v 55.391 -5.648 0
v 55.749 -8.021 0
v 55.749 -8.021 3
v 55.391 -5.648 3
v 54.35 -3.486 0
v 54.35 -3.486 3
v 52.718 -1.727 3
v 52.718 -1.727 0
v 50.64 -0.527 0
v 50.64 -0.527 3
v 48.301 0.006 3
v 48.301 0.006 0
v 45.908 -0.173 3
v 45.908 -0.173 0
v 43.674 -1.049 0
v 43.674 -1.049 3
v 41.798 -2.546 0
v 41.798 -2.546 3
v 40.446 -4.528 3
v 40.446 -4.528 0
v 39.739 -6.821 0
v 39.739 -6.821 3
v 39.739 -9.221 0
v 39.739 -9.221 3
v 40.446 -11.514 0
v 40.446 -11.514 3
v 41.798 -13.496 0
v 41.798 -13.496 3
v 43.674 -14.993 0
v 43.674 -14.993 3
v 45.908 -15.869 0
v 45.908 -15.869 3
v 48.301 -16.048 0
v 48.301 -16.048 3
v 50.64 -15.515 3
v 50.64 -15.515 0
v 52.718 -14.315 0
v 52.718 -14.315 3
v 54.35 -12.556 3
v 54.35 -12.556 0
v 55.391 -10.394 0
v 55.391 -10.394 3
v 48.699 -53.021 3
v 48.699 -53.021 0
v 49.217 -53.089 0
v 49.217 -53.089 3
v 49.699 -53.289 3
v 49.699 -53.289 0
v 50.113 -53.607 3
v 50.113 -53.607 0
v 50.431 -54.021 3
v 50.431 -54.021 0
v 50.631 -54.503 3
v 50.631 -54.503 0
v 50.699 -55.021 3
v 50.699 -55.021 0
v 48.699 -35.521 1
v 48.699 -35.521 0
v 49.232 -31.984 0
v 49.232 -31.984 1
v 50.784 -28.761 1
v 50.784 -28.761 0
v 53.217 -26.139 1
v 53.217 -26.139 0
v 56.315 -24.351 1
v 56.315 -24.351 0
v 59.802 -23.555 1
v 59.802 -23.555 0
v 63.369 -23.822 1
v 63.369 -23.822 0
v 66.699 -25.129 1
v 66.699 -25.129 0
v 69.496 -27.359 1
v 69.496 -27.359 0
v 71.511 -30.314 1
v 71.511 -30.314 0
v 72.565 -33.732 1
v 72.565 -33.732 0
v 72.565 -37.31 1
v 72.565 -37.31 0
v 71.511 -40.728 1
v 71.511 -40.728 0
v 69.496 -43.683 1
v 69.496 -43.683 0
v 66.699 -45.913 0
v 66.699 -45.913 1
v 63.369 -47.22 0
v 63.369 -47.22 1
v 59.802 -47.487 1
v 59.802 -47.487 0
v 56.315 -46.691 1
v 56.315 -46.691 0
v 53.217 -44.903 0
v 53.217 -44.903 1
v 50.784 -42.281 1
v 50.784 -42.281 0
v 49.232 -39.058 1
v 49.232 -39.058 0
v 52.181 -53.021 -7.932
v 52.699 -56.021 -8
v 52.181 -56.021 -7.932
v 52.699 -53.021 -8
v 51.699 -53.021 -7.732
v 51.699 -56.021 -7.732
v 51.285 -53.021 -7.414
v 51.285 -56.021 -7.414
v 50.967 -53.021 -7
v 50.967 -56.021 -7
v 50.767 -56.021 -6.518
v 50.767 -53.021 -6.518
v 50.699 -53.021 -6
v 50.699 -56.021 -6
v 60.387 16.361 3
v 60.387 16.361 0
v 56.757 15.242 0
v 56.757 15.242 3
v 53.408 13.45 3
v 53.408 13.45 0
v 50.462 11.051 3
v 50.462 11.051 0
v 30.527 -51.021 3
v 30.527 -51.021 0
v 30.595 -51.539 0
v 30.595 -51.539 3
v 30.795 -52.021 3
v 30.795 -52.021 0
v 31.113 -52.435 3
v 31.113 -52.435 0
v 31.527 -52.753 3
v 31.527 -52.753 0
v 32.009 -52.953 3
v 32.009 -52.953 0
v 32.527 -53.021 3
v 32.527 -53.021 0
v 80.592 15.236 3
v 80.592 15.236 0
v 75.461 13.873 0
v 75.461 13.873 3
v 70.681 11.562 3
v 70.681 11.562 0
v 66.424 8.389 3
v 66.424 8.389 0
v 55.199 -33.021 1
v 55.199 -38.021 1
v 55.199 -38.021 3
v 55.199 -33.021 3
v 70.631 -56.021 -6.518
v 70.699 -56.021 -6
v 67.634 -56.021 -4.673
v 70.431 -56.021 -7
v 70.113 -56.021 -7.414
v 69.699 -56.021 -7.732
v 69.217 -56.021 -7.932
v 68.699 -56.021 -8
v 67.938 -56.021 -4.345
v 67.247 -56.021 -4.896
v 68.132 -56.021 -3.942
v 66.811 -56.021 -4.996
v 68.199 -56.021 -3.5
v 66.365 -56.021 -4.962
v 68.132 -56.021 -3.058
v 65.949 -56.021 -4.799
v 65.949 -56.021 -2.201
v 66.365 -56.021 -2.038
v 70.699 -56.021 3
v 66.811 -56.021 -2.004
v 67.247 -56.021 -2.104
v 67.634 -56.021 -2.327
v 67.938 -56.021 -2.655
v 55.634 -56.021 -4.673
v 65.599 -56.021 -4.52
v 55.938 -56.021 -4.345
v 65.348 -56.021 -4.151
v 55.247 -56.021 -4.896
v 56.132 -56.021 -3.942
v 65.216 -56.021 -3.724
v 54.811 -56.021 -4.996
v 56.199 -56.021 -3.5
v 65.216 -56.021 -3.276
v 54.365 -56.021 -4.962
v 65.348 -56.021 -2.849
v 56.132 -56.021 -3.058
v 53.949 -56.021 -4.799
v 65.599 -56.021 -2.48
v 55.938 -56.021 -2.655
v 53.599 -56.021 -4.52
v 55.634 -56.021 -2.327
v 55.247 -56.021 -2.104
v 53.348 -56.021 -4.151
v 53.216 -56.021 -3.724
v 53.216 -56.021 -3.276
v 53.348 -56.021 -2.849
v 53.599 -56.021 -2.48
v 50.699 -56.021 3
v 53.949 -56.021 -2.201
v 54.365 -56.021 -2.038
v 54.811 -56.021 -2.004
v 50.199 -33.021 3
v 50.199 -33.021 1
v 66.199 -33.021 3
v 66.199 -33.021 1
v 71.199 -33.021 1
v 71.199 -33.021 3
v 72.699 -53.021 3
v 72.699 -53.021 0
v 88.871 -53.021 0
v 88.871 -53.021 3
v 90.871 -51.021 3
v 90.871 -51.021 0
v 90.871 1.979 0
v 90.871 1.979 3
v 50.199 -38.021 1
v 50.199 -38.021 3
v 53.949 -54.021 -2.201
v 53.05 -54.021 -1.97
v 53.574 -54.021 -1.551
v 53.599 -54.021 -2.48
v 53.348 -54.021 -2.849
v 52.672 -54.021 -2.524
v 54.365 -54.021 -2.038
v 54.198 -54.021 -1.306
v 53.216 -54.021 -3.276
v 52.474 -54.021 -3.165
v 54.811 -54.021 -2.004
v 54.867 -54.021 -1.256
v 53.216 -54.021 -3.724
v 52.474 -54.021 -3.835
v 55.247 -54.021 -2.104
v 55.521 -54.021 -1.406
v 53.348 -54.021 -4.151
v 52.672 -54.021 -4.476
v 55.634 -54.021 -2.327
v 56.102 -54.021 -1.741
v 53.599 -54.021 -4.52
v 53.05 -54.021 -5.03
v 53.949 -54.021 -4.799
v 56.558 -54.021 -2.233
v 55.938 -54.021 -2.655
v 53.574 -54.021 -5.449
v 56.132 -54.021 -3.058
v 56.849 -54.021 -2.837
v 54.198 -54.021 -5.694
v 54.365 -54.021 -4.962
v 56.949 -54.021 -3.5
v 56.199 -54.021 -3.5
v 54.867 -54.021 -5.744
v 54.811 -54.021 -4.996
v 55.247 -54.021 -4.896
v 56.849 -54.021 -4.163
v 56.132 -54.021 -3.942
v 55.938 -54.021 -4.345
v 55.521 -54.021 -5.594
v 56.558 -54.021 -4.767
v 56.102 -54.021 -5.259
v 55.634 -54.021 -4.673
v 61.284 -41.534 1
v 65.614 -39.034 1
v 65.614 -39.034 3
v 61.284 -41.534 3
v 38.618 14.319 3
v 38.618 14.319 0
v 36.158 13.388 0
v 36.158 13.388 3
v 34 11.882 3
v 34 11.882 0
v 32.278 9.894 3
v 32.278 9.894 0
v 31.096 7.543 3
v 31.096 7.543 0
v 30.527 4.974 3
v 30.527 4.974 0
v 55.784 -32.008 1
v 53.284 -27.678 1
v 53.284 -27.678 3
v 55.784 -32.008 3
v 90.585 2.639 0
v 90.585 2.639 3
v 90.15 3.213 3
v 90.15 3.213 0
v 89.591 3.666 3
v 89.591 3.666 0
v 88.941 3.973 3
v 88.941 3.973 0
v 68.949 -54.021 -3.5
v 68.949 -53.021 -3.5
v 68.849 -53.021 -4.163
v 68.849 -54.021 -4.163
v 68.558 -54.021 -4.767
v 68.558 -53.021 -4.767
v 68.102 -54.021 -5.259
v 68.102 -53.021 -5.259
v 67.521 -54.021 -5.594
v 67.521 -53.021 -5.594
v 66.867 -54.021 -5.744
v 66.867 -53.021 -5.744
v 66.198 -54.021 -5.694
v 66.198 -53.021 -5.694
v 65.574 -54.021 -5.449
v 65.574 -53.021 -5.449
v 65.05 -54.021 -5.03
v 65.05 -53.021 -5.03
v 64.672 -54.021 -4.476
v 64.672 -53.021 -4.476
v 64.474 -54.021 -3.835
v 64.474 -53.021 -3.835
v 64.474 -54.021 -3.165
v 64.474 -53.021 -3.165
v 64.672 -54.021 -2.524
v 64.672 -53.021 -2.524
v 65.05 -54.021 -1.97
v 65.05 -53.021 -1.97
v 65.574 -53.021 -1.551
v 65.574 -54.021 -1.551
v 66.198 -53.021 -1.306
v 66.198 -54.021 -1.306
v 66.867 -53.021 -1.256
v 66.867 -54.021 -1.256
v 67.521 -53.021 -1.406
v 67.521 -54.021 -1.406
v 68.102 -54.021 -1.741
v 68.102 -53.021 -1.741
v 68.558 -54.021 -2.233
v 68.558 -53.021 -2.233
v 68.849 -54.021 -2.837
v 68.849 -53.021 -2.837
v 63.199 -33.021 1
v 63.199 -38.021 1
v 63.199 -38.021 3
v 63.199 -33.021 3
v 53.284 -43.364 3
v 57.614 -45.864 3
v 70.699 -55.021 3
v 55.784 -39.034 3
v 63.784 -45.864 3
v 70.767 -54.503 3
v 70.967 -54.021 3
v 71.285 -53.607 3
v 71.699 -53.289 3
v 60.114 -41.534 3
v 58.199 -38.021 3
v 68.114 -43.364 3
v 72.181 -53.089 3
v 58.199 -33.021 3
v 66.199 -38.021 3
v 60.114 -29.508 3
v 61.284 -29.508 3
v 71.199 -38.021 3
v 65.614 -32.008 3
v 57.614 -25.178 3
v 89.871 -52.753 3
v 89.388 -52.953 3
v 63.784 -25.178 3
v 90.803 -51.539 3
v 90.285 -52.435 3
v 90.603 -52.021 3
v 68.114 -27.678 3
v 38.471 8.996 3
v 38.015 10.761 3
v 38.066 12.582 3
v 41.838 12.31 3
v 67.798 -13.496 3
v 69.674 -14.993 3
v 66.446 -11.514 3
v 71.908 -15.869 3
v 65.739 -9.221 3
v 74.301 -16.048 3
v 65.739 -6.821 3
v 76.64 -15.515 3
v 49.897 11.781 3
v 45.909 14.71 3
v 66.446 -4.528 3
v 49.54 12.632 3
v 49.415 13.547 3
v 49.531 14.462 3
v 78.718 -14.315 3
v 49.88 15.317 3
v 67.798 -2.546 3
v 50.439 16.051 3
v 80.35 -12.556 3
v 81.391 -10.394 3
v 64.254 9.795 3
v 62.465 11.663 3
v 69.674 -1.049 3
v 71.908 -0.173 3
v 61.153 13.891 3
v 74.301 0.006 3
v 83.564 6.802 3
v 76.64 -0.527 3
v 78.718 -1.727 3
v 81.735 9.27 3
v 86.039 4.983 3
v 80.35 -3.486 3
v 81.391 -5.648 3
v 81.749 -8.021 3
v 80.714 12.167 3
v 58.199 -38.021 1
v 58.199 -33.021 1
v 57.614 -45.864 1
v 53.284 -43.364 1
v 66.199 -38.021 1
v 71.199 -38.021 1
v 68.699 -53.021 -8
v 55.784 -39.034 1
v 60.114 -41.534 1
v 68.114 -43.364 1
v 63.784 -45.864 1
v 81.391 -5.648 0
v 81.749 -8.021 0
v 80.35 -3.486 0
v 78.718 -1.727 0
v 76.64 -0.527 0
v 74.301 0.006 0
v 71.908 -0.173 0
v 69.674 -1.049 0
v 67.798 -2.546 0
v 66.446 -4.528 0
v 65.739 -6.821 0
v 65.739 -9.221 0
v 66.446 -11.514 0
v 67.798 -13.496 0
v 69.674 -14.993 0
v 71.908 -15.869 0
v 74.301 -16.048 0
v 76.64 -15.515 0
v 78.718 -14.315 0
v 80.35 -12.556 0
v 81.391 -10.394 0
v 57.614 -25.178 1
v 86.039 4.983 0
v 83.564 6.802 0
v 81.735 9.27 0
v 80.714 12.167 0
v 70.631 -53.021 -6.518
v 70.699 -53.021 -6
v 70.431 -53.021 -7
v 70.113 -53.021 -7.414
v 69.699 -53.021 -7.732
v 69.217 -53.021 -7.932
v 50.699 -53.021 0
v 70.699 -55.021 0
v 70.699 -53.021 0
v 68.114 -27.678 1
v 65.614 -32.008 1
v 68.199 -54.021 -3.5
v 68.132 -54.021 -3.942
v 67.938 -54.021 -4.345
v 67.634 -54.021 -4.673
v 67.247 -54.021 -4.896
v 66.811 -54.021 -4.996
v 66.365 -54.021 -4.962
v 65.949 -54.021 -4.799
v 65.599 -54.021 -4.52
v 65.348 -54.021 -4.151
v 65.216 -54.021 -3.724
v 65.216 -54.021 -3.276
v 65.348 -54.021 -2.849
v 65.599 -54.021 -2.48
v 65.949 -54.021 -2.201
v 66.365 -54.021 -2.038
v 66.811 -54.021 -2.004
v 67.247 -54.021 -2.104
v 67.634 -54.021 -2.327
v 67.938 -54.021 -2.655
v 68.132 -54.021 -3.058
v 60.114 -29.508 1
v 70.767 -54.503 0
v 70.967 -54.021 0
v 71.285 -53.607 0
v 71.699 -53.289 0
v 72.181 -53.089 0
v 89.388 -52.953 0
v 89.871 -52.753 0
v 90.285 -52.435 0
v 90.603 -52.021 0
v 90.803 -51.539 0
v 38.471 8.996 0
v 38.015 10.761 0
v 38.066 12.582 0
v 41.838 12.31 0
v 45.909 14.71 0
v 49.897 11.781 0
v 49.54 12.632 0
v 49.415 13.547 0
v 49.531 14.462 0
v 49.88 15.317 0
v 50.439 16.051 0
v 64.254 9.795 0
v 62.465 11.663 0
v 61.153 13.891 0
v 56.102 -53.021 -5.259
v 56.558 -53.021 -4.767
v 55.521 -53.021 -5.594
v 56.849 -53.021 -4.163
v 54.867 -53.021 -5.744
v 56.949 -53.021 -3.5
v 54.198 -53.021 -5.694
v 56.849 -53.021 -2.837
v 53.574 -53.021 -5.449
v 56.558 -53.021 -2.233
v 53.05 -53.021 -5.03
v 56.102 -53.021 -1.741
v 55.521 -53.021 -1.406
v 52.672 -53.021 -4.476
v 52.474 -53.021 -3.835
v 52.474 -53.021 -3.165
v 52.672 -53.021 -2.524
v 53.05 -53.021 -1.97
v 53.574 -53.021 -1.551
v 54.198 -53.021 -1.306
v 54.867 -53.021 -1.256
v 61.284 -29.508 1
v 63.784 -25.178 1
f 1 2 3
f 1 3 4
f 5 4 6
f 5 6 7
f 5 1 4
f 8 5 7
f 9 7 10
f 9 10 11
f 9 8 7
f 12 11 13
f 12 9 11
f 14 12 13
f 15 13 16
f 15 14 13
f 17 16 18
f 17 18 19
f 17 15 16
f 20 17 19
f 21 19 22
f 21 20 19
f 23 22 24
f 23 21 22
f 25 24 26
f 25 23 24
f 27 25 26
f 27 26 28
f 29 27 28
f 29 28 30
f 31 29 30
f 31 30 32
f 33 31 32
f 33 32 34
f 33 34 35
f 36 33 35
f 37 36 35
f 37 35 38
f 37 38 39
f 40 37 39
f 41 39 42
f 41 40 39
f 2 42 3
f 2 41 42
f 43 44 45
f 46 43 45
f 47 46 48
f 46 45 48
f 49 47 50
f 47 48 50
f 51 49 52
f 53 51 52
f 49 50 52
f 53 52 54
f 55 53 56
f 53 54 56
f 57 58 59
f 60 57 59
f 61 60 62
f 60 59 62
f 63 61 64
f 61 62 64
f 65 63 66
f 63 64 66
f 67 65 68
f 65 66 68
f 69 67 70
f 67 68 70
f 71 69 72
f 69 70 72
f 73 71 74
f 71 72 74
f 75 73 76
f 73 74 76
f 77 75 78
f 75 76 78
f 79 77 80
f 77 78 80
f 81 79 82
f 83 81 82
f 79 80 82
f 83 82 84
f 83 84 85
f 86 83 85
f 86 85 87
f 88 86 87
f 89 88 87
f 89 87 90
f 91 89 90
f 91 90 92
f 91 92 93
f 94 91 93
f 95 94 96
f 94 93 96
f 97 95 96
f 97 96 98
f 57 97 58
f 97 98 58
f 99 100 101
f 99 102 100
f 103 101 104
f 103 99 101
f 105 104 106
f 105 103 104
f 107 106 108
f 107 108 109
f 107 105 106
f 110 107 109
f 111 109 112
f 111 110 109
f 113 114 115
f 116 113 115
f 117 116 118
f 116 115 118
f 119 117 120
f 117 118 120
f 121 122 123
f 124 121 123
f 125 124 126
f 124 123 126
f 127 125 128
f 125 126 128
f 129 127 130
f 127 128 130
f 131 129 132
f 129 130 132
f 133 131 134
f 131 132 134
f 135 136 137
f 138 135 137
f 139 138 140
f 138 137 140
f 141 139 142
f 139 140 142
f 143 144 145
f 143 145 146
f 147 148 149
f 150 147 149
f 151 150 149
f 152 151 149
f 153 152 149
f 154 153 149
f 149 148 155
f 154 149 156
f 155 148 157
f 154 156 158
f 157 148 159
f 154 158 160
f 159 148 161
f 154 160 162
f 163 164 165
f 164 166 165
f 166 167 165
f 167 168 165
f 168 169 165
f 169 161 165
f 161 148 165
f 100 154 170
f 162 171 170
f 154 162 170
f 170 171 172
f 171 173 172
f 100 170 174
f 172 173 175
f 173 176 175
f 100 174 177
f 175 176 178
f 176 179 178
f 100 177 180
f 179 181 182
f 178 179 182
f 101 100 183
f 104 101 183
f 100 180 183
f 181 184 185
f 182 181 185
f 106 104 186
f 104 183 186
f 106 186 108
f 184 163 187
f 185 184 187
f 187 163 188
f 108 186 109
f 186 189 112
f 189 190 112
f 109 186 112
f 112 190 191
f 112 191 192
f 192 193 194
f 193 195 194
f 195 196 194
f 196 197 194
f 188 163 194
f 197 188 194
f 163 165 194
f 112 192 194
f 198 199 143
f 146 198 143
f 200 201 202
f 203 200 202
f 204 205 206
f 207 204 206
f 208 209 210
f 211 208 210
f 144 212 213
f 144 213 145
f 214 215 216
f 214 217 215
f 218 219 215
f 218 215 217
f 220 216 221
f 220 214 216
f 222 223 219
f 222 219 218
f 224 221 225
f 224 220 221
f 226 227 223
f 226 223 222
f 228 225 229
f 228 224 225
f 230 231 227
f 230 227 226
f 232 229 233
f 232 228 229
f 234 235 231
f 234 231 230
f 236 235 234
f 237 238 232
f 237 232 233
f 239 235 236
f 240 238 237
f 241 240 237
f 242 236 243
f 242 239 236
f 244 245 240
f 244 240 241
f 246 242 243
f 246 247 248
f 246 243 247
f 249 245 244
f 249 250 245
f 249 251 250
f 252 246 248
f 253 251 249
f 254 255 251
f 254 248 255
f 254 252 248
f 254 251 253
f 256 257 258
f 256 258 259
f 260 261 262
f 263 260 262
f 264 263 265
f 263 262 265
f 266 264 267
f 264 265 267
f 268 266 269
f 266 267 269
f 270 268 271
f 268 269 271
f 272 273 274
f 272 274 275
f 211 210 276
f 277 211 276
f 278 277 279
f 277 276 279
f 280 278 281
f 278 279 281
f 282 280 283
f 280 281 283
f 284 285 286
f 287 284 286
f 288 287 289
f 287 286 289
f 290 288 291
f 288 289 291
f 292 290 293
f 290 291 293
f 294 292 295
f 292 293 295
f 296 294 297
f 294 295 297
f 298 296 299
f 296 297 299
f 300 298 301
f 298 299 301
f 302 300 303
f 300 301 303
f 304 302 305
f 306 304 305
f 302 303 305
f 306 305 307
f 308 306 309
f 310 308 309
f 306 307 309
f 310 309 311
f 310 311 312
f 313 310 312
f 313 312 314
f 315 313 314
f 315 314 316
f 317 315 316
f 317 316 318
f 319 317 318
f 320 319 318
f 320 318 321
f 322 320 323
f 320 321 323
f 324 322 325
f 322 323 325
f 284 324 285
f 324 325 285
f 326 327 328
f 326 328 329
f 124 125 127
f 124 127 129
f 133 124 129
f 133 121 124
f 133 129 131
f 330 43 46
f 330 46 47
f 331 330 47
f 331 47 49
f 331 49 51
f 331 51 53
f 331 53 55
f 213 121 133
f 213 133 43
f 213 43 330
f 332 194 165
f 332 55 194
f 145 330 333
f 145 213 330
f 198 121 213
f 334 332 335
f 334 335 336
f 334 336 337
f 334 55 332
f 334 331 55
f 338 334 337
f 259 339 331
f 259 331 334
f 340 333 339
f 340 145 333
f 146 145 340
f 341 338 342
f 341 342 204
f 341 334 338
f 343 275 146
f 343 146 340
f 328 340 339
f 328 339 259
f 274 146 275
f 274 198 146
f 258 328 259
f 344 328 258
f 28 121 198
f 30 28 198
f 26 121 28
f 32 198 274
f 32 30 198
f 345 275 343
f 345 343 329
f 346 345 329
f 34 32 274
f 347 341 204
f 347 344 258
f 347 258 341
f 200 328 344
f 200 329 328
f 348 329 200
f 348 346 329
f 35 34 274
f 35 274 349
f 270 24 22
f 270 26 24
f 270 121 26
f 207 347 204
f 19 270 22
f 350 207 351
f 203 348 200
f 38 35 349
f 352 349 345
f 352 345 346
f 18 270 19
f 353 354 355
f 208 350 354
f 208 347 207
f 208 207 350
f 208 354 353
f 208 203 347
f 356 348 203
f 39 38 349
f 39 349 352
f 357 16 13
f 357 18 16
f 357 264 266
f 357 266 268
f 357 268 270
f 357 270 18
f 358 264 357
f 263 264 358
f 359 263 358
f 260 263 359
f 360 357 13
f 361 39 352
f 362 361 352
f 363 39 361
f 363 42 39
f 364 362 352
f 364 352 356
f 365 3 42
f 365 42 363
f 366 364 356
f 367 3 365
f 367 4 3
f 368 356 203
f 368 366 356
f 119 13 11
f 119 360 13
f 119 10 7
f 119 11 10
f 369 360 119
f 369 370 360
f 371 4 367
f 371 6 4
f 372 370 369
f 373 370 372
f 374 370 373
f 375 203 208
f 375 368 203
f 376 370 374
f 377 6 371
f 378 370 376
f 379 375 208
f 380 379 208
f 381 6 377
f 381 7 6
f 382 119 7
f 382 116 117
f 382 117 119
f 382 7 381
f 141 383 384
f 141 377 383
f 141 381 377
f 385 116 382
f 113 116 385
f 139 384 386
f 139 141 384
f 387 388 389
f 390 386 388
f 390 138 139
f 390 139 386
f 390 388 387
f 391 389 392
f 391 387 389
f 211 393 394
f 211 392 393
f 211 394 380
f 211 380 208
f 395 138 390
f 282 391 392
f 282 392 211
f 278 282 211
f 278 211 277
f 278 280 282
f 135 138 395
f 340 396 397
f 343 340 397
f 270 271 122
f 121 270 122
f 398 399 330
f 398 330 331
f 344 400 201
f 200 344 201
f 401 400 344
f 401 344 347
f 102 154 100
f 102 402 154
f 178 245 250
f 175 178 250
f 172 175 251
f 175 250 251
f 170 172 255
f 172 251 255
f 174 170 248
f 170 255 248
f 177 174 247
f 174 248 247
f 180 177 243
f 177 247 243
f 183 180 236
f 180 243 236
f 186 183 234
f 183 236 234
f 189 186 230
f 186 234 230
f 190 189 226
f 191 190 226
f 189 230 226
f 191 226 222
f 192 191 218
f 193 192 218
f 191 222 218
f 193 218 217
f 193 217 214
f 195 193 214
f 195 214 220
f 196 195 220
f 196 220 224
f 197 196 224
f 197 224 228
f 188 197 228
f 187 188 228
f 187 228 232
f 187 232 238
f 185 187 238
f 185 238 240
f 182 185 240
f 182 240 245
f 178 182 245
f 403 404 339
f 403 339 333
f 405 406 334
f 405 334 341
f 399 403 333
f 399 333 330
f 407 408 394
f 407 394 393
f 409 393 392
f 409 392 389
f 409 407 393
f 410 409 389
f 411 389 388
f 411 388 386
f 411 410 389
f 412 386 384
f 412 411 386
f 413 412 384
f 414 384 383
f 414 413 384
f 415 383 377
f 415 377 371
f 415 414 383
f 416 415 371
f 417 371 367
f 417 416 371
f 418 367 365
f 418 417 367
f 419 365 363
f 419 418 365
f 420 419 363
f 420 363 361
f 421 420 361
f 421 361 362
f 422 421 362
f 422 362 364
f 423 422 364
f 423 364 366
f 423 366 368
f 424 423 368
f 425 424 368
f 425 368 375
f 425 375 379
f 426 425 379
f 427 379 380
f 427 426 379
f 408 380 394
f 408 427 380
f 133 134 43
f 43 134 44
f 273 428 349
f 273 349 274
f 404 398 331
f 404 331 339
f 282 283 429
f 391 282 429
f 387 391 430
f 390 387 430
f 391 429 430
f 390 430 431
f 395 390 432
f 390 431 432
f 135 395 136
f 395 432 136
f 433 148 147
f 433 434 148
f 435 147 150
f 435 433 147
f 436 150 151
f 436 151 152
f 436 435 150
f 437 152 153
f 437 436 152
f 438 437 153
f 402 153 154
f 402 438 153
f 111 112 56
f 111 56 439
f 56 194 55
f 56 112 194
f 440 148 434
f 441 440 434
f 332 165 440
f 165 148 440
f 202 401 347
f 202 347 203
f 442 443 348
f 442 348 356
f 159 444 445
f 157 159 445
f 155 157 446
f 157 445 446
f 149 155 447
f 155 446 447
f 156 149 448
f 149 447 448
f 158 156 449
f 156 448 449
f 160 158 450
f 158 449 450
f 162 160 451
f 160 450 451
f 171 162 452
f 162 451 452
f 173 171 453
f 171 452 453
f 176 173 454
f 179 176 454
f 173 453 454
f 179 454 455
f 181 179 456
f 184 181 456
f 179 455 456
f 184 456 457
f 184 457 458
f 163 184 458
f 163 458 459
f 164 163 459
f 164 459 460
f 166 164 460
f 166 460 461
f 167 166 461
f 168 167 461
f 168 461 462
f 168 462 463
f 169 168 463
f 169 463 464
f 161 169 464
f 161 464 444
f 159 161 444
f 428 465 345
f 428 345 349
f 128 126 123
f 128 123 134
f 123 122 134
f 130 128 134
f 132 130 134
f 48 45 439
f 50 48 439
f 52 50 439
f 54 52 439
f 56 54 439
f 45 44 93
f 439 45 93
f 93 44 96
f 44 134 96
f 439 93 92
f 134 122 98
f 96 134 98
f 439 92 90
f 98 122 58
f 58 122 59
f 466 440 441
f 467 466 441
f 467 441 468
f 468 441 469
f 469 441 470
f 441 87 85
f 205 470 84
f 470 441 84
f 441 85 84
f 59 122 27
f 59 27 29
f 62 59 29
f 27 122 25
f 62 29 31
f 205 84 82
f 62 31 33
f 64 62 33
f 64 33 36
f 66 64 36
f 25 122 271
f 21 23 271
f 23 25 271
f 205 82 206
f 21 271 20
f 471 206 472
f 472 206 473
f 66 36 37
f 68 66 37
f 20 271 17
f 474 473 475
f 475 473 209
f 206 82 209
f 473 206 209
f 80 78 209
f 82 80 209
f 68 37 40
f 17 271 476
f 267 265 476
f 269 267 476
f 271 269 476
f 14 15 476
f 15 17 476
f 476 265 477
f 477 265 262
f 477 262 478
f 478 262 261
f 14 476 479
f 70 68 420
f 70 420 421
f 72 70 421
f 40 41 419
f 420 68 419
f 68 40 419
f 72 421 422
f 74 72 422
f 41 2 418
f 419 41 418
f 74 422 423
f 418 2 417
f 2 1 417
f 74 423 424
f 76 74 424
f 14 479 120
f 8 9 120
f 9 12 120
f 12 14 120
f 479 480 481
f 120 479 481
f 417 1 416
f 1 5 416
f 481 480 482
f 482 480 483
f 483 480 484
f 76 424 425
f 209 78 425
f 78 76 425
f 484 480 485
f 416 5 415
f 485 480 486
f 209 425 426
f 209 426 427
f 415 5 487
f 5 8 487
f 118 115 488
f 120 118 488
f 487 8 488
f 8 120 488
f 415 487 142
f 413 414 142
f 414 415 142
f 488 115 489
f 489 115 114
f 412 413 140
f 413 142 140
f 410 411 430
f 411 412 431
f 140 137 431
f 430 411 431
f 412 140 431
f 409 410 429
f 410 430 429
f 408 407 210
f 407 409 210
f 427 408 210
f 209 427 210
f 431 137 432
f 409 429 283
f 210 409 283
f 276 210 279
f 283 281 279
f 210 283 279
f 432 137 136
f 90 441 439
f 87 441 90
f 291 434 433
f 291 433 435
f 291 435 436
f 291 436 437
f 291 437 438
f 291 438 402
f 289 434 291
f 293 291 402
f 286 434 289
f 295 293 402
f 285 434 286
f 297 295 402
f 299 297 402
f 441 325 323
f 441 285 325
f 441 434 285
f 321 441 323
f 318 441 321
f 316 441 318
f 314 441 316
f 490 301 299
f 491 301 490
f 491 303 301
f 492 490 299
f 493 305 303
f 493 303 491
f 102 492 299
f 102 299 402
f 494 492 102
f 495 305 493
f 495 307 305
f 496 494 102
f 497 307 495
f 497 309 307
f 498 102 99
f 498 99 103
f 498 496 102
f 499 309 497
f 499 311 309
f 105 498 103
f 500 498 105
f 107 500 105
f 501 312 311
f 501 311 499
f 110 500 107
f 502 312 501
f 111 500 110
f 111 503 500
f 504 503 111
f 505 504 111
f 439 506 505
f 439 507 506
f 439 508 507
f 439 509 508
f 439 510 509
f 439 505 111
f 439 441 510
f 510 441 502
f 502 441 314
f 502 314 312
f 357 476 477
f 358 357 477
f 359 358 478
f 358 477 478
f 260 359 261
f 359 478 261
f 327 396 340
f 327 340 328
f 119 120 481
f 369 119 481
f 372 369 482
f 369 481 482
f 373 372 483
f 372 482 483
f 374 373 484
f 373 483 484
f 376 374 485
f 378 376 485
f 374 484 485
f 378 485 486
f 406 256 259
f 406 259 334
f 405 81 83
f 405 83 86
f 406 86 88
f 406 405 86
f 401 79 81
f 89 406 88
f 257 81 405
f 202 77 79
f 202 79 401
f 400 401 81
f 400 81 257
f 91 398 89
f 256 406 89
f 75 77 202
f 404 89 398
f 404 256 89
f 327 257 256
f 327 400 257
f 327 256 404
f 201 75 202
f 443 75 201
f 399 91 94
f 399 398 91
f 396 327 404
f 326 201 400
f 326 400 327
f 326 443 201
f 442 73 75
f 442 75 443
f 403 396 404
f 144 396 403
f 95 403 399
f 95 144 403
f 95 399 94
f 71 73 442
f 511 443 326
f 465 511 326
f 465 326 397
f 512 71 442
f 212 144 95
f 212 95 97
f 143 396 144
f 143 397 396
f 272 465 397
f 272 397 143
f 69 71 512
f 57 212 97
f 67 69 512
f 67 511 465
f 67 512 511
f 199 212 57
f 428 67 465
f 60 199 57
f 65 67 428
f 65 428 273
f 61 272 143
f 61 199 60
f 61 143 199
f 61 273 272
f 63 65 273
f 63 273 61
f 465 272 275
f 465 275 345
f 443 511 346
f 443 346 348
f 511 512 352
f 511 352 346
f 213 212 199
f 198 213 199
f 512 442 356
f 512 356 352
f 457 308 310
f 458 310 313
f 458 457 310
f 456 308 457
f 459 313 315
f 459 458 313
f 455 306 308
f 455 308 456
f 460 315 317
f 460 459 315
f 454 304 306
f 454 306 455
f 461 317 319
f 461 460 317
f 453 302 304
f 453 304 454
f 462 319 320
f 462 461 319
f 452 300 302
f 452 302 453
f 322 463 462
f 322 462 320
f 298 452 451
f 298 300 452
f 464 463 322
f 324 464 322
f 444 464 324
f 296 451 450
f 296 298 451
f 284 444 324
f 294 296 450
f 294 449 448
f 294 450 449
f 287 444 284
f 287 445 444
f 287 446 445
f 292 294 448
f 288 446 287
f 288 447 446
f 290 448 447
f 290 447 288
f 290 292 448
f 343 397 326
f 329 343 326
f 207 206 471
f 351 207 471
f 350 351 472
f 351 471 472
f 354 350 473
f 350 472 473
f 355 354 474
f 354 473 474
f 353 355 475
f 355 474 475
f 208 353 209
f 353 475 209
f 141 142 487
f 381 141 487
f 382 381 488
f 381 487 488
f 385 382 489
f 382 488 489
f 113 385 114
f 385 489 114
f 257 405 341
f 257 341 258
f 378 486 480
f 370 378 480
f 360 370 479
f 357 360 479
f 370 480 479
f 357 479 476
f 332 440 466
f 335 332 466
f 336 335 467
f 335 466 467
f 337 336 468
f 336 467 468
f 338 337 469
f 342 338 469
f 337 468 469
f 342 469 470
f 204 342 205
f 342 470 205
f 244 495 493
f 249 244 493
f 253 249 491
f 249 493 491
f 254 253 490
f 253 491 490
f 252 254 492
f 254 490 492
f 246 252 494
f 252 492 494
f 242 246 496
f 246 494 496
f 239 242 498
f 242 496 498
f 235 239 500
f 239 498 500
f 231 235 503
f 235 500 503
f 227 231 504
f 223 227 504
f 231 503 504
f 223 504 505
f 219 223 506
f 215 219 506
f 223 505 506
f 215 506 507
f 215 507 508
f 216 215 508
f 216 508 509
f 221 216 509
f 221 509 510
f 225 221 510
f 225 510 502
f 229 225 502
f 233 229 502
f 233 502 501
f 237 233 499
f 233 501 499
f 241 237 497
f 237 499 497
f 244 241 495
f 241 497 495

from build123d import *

# Parameters (mm, degrees)
MODEL_R                 = 8.05
MODEL_W                 = 5
MODEL_H                 = 5
SALIENTE_EXTRUIR1_DEPTH = 3
CROQUIS3_W              = 20
CROQUIS3_H              = 3
SALIENTE_EXTRUIR2_DEPTH = 8
CROQUIS4_R              = 1.5
CORTAR_EXTRUIR1_DEPTH   = 3
CROQUIS5_R              = 2.25
CORTAR_EXTRUIR2_DEPTH   = 1
REDONDEO1_R             = 2
CROQUIS6_R              = 12
CORTAR_EXTRUIR3_DEPTH   = 1


with BuildPart() as part:
    # Model → Saliente-Extruir1 (new body)
    with BuildSketch(Plane.XY):
        with BuildLine():
            Line((50.698959582, -56.020997464), (70.698959582, -56.020997464))
            Line((70.698959582, -56.020997464), (70.698959582, -55.020997464))
            ThreePointArc((70.698959582, -55.020997464), (71.28474602, -53.606783901), (72.698959582, -53.020997464))
            Line((72.698959582, -53.020997464), (88.870799912, -53.020997464))
            ThreePointArc((88.870799912, -53.020997464), (90.285013474, -52.435211026), (90.870799912, -51.020997464))
            Line((90.870799912, -51.020997464), (90.870799912, 1.979002536))
            ThreePointArc((90.870799912, 1.979002536), (90.150187884, 3.212884764), (88.940527152, 3.973455574))
            ThreePointArc((88.940527152, 3.973455574), (82.556801864, 7.967186508), (80.592387516, 15.236499516))
            ThreePointArc((80.592387516, 15.236499516), (73.016137183, 12.831206377), (66.424253692, 8.389126209))
            ThreePointArc((66.424253692, 8.389126209), (62.464845981, 11.66270114), (60.387431279, 16.361376528))
            ThreePointArc((60.387431279, 16.361376528), (55.039384462, 14.426569266), (50.461877073, 11.051438157))
            ThreePointArc((50.461877073, 11.051438157), (49.41482724, 13.546636971), (50.438823204, 16.051385009))
            ThreePointArc((50.438823204, 16.051385009), (43.800023098, 13.634815248), (38.471226177, 8.99613013))
            ThreePointArc((38.471226177, 8.99613013), (37.976525569, 11.673196605), (38.618250464, 14.318872844))
            ThreePointArc((38.618250464, 14.318872844), (33.077419178, 10.94136051), (30.527119253, 4.974420659))
            Line((30.527119253, 4.974420659), (30.527119253, -51.020997464))
            ThreePointArc((30.527119253, -51.020997464), (31.112905691, -52.435211026), (32.527119253, -53.020997464))
            Line((32.527119253, -53.020997464), (48.698959582, -53.020997464))
            ThreePointArc((48.698959582, -53.020997464), (50.113173145, -53.606783901), (50.698959582, -55.020997464))
            Line((50.698959582, -55.020997464), (50.698959582, -56.020997464))
        make_face()
        with Locations((47.698959583, -8.020997464)):
            Circle(MODEL_R, mode=Mode.SUBTRACT)
        with Locations((73.698959582, -8.020997464)):
            Circle(MODEL_R, mode=Mode.SUBTRACT)
        Polygon((53.283896073, -43.364264203), (57.614023092, -45.864264203), (60.114023092, -41.534137185), (55.783896073, -39.034137185), align=None, mode=Mode.SUBTRACT)
        Polygon((63.783896073, -45.864264204), (68.114023092, -43.364264204), (65.614023092, -39.034137185), (61.283896073, -41.534137185), align=None, mode=Mode.SUBTRACT)
        with Locations((68.698959582, -35.520997464)):
            Rectangle(MODEL_W, MODEL_H, mode=Mode.SUBTRACT)
        Polygon((68.114023092, -27.677730724), (63.783896073, -25.177730724), (61.283896073, -29.507857743), (65.614023092, -32.007857743), align=None, mode=Mode.SUBTRACT)
        Polygon((57.614023092, -25.177730724), (53.283896073, -27.677730724), (55.783896073, -32.007857743), (60.114023092, -29.507857743), align=None, mode=Mode.SUBTRACT)
        with Locations((52.698959582, -35.520997464)):
            Rectangle(MODEL_W, MODEL_H, mode=Mode.SUBTRACT)
        with Locations((60.698959582, -35.520997464)):
            Rectangle(MODEL_W, MODEL_H, mode=Mode.SUBTRACT)
    extrude(amount=SALIENTE_EXTRUIR1_DEPTH)

    # Croquis3 → Saliente-Extruir2 (add)
    with BuildSketch(Plane(origin=(0, 0, 0), x_dir=(-1, 0, 0), z_dir=(0, 0, -1))):
        with Locations((-60.698959582, -54.520997464)):
            Rectangle(CROQUIS3_W, CROQUIS3_H)
    extrude(amount=SALIENTE_EXTRUIR2_DEPTH)

    # Croquis4 → Cortar-Extruir1 (cut)
    with BuildSketch(Plane(origin=(0, -53.020997464, 0), x_dir=(1, 0, 0), z_dir=(0, 1, 0))):
        with Locations((66.698959582, 3.5)):
            Circle(CROQUIS4_R)
        with Locations((54.698959582, 3.5)):
            Circle(CROQUIS4_R)
    extrude(amount=-CORTAR_EXTRUIR1_DEPTH, mode=Mode.SUBTRACT)

    # Croquis5 → Cortar-Extruir2 (cut)
    with BuildSketch(Plane(origin=(0, -53.020997464, 0), x_dir=(1, 0, 0), z_dir=(0, 1, 0))):
        with Locations((66.698959582, 3.5)):
            Circle(CROQUIS5_R)
        with Locations((54.698959582, 3.5)):
            Circle(CROQUIS5_R)
    extrude(amount=-CORTAR_EXTRUIR2_DEPTH, mode=Mode.SUBTRACT)

    # Redondeo1
    redondeo1_edges = [part.edges().sort_by_distance(p)[0] for p in [
        (50.698959582, -54.520997464, -8),
        (70.698959582, -54.520997464, -8),
    ]]
    fillet(redondeo1_edges, radius=REDONDEO1_R)

    # Croquis6 → Cortar-Extruir3 (cut)
    with BuildSketch(Plane(origin=(0, 0, 0), x_dir=(-1, 0, 0), z_dir=(0, 0, -1))):
        with Locations((-60.698959582, -35.520997464)):
            Circle(CROQUIS6_R)
    extrude(amount=-CORTAR_EXTRUIR3_DEPTH, mode=Mode.SUBTRACT)


solid = part.part
